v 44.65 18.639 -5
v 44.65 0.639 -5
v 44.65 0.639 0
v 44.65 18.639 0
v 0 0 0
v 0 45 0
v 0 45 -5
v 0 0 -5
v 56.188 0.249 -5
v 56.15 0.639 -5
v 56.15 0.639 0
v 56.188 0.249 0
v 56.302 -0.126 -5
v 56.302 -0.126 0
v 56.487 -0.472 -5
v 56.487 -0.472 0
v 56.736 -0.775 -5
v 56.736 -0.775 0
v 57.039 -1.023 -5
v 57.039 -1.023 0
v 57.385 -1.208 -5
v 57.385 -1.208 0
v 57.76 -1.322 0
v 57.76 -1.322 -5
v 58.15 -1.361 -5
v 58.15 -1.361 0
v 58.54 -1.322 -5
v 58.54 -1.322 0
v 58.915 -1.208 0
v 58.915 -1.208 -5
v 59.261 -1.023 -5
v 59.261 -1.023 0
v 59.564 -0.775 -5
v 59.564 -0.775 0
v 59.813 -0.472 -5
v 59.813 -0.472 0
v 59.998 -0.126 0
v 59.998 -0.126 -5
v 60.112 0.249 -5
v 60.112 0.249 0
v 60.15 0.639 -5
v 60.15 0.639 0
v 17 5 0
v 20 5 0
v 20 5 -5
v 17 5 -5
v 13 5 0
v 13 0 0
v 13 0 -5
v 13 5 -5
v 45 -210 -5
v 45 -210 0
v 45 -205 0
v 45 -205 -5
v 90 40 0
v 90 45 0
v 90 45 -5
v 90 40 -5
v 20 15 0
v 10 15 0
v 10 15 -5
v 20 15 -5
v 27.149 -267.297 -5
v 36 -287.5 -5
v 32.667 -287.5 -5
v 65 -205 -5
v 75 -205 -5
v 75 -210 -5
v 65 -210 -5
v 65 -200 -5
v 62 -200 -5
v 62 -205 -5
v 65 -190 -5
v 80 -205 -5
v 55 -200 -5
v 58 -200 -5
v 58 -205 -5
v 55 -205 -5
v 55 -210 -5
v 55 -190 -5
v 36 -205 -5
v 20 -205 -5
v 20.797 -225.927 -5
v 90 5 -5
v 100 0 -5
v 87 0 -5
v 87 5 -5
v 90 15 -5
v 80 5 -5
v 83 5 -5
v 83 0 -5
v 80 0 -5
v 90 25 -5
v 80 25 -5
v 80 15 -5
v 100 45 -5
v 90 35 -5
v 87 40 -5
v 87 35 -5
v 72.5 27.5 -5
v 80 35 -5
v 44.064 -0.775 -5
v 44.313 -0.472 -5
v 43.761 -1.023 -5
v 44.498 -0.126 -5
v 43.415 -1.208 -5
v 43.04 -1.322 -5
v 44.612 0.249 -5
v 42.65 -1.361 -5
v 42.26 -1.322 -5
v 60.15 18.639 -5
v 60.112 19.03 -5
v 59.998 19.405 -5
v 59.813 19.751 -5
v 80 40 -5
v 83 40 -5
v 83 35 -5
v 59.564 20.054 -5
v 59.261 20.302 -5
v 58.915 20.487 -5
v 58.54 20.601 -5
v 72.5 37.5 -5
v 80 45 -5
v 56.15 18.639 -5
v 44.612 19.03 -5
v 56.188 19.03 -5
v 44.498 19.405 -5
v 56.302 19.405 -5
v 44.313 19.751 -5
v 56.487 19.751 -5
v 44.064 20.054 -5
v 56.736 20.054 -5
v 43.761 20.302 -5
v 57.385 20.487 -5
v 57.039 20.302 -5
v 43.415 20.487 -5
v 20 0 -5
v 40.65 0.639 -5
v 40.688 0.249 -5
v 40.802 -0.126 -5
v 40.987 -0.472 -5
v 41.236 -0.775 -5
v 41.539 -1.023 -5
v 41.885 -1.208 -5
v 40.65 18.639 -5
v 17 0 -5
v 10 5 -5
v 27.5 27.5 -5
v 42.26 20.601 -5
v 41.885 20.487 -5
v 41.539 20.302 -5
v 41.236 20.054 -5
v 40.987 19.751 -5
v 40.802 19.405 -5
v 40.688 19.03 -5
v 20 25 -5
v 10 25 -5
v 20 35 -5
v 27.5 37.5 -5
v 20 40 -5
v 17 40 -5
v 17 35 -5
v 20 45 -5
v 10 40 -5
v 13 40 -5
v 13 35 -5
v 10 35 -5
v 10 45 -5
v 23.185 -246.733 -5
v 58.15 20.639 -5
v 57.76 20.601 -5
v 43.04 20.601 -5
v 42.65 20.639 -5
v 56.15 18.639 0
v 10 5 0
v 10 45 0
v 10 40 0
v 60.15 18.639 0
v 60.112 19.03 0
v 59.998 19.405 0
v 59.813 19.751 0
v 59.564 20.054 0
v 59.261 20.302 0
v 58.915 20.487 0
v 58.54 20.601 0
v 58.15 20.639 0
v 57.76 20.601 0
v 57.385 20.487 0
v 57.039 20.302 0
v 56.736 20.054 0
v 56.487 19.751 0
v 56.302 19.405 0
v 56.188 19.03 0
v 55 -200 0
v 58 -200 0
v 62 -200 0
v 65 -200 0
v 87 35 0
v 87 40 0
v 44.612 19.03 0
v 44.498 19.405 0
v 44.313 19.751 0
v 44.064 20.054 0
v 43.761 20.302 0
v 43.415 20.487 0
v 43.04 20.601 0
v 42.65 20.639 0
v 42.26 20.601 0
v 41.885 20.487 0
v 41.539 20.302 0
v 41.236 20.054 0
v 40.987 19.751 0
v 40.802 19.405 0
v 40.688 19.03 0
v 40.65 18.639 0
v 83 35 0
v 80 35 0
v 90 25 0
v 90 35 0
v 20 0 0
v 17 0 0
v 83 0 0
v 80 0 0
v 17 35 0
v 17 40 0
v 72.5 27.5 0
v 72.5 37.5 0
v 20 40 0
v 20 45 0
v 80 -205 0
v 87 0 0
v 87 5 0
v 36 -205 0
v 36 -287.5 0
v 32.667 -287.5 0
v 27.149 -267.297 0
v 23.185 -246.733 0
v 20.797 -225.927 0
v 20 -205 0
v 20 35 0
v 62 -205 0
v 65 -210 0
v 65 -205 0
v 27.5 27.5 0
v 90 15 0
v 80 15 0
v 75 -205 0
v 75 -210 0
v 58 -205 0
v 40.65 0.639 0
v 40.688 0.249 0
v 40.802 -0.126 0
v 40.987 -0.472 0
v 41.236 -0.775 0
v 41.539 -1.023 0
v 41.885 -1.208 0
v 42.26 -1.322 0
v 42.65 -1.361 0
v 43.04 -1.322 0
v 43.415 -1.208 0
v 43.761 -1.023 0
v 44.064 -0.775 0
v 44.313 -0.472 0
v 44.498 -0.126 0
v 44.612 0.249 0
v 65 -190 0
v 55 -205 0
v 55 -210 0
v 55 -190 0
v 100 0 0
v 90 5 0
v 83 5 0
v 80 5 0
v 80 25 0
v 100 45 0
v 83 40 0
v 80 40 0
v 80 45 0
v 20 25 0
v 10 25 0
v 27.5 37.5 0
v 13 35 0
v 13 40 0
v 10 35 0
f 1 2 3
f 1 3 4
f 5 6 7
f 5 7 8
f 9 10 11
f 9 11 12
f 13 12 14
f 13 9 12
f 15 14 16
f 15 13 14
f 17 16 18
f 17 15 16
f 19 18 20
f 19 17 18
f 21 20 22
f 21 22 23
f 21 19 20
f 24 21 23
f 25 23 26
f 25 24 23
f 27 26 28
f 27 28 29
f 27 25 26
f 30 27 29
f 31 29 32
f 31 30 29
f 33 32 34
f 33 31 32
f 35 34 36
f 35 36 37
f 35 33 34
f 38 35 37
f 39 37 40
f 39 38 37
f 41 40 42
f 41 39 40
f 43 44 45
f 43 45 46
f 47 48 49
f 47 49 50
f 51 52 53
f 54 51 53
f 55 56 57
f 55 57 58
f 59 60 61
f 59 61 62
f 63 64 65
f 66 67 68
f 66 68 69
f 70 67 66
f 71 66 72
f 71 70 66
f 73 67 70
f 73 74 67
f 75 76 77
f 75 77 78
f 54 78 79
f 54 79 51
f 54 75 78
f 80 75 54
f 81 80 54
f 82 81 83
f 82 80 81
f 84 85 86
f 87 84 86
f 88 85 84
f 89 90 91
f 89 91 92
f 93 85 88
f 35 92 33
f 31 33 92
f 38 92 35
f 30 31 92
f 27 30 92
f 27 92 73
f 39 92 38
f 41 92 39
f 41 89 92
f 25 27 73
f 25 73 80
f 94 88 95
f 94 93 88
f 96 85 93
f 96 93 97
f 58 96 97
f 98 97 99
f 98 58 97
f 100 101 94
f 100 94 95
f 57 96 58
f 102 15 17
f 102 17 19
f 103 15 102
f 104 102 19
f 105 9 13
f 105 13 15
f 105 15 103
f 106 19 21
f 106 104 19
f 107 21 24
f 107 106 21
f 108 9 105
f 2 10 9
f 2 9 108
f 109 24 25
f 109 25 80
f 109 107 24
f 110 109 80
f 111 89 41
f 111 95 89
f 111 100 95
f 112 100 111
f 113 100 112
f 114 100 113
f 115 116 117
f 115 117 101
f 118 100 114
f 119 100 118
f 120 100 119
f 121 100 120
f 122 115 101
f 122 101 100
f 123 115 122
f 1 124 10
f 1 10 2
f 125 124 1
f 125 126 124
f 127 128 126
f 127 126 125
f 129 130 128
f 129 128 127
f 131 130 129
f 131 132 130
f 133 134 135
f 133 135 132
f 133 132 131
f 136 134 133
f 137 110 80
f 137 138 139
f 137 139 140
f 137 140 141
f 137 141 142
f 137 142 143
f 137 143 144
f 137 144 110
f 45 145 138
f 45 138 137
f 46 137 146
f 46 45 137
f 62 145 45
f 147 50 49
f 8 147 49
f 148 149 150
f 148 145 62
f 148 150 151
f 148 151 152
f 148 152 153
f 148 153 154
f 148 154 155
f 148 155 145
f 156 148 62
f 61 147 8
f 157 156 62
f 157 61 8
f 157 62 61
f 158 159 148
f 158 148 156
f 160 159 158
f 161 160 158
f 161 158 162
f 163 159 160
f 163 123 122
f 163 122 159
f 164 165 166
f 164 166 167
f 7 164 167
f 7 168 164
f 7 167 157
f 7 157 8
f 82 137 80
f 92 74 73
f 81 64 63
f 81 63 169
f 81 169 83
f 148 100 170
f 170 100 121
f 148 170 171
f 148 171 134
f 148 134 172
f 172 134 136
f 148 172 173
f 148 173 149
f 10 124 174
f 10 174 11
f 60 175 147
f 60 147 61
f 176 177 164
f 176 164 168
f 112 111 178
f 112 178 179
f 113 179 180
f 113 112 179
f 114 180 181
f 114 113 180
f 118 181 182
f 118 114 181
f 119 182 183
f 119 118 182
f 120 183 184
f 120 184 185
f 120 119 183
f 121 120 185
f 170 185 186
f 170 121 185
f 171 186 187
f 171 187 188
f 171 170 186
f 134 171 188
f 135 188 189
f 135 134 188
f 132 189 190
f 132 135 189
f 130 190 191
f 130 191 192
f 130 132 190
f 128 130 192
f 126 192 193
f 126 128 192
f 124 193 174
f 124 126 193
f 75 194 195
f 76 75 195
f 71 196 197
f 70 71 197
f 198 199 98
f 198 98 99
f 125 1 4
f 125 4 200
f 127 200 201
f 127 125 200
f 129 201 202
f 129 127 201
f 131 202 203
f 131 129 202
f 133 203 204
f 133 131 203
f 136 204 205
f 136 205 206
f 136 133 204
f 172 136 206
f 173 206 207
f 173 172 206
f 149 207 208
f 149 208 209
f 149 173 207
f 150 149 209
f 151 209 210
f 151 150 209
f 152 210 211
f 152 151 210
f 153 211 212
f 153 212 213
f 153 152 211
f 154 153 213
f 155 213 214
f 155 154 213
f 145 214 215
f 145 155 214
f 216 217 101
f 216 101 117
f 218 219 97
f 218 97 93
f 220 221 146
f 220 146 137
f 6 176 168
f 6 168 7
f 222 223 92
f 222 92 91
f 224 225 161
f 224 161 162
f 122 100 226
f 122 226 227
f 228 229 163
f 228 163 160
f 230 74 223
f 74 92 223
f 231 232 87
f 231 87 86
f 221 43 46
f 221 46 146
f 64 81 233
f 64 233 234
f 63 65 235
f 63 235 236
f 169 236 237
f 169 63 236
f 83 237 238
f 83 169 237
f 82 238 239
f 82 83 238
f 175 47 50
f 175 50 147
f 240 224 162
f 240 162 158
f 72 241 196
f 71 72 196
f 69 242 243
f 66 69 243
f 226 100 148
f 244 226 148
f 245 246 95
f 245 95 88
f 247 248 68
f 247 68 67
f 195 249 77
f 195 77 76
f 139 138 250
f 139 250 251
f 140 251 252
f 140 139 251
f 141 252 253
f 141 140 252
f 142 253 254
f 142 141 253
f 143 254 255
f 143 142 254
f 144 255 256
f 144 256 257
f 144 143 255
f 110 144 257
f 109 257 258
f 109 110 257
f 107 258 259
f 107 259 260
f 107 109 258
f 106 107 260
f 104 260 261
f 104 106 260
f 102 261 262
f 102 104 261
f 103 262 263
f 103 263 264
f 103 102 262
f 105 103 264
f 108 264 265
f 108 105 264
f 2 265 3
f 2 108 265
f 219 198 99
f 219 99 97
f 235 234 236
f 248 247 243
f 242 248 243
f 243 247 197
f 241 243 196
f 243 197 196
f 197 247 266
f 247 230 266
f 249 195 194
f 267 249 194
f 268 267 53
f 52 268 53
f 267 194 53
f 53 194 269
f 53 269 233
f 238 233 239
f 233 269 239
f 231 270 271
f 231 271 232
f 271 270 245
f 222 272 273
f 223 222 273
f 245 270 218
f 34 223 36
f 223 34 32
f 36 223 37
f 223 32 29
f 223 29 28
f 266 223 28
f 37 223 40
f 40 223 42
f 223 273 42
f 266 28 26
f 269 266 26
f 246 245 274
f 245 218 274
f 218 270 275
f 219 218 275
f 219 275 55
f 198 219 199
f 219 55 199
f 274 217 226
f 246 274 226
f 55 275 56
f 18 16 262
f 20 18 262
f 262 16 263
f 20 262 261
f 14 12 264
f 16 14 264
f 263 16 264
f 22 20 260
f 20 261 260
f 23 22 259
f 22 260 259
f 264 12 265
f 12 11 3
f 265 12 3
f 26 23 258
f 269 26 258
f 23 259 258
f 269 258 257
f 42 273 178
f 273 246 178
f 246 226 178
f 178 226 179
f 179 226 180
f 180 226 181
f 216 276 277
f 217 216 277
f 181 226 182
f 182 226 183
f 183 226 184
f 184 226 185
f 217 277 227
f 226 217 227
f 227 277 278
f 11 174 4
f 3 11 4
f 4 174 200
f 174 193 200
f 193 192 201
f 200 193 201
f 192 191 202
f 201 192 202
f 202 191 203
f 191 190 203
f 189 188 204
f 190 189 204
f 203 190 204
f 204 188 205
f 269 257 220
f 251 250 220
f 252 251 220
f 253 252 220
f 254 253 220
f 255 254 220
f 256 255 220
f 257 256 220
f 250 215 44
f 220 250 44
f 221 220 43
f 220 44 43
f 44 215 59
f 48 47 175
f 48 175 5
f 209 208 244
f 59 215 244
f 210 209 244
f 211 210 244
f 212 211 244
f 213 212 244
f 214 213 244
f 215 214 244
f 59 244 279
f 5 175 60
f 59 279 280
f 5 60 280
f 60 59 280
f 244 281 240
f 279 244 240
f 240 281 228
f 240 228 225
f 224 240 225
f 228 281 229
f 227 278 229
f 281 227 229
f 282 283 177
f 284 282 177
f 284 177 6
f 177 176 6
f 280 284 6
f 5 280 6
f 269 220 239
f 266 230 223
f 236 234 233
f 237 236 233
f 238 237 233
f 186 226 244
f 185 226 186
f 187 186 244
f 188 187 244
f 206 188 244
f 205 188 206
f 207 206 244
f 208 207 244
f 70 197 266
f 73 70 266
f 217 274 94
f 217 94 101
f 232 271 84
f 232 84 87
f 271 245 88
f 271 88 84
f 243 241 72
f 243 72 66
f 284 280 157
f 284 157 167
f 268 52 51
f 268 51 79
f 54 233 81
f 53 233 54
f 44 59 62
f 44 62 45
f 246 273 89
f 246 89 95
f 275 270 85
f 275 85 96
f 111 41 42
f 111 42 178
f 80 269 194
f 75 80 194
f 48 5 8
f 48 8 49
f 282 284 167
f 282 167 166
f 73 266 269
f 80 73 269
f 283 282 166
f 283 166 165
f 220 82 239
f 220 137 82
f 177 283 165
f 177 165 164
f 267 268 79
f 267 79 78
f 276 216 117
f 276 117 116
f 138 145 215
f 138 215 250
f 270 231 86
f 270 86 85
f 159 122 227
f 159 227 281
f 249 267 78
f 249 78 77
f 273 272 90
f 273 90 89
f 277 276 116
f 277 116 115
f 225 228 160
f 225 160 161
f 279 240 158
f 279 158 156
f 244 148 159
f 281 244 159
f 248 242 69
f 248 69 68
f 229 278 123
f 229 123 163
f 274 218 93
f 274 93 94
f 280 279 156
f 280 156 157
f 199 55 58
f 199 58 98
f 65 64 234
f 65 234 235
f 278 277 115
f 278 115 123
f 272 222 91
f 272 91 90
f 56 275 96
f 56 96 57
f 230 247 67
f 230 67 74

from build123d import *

# Parameters (mm, degrees)
BOSS_EXTRUDE1_DEPTH = 5
CUT_EXTRUDE3_DEPTH  = 5
SKETCH5_W           = 45
SKETCH5_H           = 10
CUT_EXTRUDE4_DEPTH  = 10
SKETCH6_W           = 10
SKETCH6_H           = 5
CUT_EXTRUDE5_DEPTH  = 5
SKETCH7_W           = 60
SKETCH7_H           = 5
BOSS_EXTRUDE2_DEPTH = 200
SKETCH8_W           = 10
SKETCH8_H           = 5
BOSS_EXTRUDE3_DEPTH = 5
SKETCH9_W           = 4
SKETCH9_H           = 5
CUT_EXTRUDE6_DEPTH  = 5
BOSS_EXTRUDE4_DEPTH = 5


with BuildPart() as part:
    # Sketch1 → Boss-Extrude1 (new body)
    with BuildSketch(Plane.XY):
        Polygon((0, -5), (10, -5), (10, 0), (13, 0), (13, 5), (10, 5), (10, 15), (20, 15), (20, 5), (17, 5), (17, 0), (20, 0), (20, -5), (80, -5), (80, 0), (83, 0), (83, 5), (80, 5), (80, 15), (90, 15), (90, 5), (87, 5), (87, 0), (90, 0), (90, -5), (100, -5), (100, 45), (90, 45), (90, 40), (87, 40), (87, 35), (90, 35), (90, 25), (80, 25), (80, 35), (83, 35), (83, 40), (80, 40), (80, 45), (20, 45), (20, 40), (17, 40), (17, 35), (20, 35), (20, 25), (10, 25), (10, 35), (13, 35), (13, 40), (10, 40), (10, 45), (0, 45), align=None)
    extrude(amount=-BOSS_EXTRUDE1_DEPTH)

    # Sketch4 → Cut-Extrude3 (cut)
    with BuildSketch(Plane(origin=(0, 0, -5), x_dir=(-1, 0, 0), z_dir=(0, 0, -1))):
        with BuildLine():
            Line((-60.15, 0.639479816), (-60.15, 18.639479816))
            ThreePointArc((-60.15, 18.639479816), (-58.15, 20.639479816), (-56.15, 18.639479816))
            Line((-56.15, 18.639479816), (-56.15, 0.639479816))
            ThreePointArc((-56.15, 0.639479816), (-58.15, -1.360520184), (-60.15, 0.639479816))
        make_face()
        with BuildLine():
            Line((-44.65, 0.639479816), (-44.65, 18.639479816))
            ThreePointArc((-44.65, 18.639479816), (-42.65, 20.639479816), (-40.65, 18.639479816))
            Line((-40.65, 18.639479816), (-40.65, 0.639479816))
            ThreePointArc((-40.65, 0.639479816), (-42.65, -1.360520184), (-44.65, 0.639479816))
        make_face()
    extrude(amount=-CUT_EXTRUDE3_DEPTH, mode=Mode.SUBTRACT)

    # Sketch5 → Cut-Extrude4 (cut)
    with BuildSketch(Plane(origin=(0, 0, -5), x_dir=(-1, 0, 0), z_dir=(0, 0, -1))):
        with Locations((-50, 32.5)):
            Rectangle(SKETCH5_W, SKETCH5_H)
    extrude(amount=-CUT_EXTRUDE4_DEPTH, mode=Mode.SUBTRACT)

    # Sketch6 → Cut-Extrude5 (cut)
    with BuildSketch(Plane.XY):
        with Locations((5, -2.5)):
            Rectangle(SKETCH6_W, SKETCH6_H)
        with Locations((95, -2.5)):
            Rectangle(SKETCH6_W, SKETCH6_H)
    extrude(amount=-CUT_EXTRUDE5_DEPTH, mode=Mode.SUBTRACT)

    # Sketch7 → Boss-Extrude2 (add)
    with BuildSketch(Plane.XZ.offset(5)):
        with Locations((50, -2.5)):
            Rectangle(SKETCH7_W, SKETCH7_H)
    extrude(amount=BOSS_EXTRUDE2_DEPTH)

    # Sketch8 → Boss-Extrude3 (add)
    with BuildSketch(Plane.XY):
        with Locations((50, -207.5)):
            Rectangle(SKETCH8_W, SKETCH8_H)
        with Locations((70, -207.5)):
            Rectangle(SKETCH8_W, SKETCH8_H)
    extrude(amount=-BOSS_EXTRUDE3_DEPTH)

    # Sketch9 → Cut-Extrude6 (cut)
    with BuildSketch(Plane.XY):
        Polygon((55, -200), (58, -200), (62, -200), (65, -200), (65, -190), (55, -190), align=None)
        with Locations((60, -202.5)):
            Rectangle(SKETCH9_W, SKETCH9_H)
    extrude(amount=-CUT_EXTRUDE6_DEPTH, mode=Mode.SUBTRACT)

    # Sketch10 → Boss-Extrude4 (add)
    with BuildSketch(Plane(origin=(0, 0, -5), x_dir=(-1, 0, 0), z_dir=(0, 0, -1))):
        with BuildLine():
            Line((-36, -287.5), (-32.66671961, -287.5))
            ThreePointArc((-32.66671961, -287.5), (-23.1851254, -246.733367303), (-20, -205))
            Line((-20, -205), (-36, -205))
            Line((-36, -205), (-36, -287.5))
        make_face()
    extrude(amount=-BOSS_EXTRUDE4_DEPTH)


solid = part.part
